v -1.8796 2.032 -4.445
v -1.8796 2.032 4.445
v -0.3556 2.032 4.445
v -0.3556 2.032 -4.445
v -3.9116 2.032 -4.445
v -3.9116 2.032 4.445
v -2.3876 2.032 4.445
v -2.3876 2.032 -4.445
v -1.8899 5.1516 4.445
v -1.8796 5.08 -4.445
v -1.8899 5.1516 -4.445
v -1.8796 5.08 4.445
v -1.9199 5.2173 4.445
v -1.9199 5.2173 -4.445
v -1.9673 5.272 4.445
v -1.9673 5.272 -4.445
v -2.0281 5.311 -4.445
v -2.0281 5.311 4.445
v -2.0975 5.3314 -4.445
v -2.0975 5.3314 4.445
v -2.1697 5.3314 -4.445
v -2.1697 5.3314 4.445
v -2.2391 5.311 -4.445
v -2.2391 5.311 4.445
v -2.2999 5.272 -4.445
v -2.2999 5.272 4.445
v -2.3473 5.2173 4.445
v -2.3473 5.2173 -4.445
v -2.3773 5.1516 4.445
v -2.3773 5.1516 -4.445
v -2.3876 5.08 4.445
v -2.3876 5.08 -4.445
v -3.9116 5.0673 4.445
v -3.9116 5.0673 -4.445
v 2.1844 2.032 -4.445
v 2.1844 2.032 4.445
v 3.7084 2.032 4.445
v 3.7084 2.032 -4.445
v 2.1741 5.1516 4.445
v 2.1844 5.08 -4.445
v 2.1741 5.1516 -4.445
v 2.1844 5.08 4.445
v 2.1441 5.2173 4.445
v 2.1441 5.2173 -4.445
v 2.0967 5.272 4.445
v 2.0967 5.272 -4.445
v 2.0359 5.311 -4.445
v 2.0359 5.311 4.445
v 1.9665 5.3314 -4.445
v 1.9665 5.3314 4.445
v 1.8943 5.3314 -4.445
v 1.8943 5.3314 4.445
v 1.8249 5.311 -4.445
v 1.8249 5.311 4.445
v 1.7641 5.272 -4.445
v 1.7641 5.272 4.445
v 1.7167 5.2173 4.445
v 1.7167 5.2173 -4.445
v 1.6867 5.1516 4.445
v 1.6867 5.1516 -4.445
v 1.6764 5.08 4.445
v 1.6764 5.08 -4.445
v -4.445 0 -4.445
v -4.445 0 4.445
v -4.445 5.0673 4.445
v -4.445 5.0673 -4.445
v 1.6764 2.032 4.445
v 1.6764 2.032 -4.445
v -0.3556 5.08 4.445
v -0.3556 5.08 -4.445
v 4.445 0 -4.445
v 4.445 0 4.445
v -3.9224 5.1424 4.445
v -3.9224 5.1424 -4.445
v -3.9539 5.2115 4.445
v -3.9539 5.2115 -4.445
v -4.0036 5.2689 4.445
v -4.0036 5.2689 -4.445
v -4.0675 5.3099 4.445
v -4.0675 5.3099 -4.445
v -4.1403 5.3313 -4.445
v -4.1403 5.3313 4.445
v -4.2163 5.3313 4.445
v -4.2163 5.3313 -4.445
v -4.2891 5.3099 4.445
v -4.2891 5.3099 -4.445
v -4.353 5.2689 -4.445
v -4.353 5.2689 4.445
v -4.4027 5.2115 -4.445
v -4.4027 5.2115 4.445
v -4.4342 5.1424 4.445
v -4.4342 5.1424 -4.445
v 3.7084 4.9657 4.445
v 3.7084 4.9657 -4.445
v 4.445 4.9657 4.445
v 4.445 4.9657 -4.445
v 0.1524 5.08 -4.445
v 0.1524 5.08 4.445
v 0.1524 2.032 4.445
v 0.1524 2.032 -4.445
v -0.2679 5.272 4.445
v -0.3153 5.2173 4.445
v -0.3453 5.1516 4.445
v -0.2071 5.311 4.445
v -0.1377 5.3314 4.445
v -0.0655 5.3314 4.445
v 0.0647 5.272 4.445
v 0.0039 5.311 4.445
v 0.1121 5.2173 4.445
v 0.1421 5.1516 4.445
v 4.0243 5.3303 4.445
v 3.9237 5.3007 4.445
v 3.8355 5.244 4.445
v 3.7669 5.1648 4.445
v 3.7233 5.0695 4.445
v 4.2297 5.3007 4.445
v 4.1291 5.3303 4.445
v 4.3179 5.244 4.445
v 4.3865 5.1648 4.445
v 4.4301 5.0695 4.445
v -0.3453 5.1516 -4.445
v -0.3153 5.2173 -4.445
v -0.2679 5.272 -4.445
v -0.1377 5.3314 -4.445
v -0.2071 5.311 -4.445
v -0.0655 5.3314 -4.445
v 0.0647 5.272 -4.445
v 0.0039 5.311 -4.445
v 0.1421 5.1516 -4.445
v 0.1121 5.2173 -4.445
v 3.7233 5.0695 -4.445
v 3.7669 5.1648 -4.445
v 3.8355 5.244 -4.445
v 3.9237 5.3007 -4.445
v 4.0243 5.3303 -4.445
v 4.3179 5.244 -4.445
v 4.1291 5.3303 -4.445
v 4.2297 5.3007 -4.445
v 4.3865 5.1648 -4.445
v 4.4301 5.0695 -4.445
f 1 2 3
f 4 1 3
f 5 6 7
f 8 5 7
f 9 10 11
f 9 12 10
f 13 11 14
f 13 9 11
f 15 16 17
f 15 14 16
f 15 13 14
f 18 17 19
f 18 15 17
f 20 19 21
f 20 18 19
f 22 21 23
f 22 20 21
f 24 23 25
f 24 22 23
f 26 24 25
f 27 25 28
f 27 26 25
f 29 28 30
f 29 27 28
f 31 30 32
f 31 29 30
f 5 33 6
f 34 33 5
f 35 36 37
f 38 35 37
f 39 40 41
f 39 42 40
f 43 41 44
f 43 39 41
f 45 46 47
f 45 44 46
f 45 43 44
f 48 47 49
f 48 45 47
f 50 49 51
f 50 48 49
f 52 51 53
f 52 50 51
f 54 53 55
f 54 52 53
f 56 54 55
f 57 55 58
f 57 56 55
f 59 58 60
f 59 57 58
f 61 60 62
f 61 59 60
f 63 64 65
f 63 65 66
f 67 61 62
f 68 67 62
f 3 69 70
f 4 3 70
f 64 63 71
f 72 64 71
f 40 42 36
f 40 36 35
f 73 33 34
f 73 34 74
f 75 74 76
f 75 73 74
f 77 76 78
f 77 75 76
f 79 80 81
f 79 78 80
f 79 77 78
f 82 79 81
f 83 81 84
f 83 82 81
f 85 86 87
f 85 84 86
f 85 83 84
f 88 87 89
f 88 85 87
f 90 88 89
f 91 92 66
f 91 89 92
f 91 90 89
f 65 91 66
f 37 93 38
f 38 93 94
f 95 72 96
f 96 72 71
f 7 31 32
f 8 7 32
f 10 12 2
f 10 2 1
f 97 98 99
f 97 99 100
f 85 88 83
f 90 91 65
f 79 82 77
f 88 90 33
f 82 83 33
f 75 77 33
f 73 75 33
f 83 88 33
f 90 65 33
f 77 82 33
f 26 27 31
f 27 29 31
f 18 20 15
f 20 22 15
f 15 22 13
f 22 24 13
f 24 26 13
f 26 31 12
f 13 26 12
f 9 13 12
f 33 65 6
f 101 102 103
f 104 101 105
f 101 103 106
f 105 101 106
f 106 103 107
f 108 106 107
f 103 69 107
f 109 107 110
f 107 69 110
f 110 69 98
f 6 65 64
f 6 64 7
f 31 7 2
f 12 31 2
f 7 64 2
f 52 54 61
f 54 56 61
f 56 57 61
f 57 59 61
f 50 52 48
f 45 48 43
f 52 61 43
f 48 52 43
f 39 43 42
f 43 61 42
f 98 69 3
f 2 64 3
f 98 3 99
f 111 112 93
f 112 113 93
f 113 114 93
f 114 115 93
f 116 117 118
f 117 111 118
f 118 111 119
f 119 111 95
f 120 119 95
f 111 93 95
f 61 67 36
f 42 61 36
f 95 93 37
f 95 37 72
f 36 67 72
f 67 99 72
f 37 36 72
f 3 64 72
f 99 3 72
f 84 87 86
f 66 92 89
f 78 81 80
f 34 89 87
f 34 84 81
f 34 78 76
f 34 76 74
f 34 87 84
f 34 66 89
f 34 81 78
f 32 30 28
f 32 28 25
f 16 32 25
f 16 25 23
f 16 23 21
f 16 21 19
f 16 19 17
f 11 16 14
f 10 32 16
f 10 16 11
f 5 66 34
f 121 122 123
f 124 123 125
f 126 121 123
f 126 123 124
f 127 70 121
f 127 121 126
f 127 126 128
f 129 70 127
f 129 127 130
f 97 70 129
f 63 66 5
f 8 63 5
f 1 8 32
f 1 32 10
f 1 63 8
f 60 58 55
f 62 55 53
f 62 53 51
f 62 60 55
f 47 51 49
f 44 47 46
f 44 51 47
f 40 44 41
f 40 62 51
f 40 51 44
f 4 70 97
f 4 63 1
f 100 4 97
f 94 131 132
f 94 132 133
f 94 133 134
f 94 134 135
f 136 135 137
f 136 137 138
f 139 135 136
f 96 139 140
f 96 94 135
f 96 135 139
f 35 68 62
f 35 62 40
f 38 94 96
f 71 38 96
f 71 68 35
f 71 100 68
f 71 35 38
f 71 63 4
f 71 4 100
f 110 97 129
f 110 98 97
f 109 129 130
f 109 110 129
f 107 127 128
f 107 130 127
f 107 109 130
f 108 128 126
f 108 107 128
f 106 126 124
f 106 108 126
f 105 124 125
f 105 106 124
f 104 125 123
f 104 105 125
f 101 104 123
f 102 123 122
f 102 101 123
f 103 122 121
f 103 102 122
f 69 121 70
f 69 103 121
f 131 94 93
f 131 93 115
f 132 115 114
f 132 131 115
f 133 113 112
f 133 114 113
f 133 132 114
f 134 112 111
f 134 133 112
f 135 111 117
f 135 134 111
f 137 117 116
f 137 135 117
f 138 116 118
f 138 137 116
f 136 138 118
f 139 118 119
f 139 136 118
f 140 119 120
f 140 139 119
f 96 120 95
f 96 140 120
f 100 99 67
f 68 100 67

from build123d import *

# Parameters (mm, degrees)
SKETCH1_W           = 8.89
SKETCH1_H           = 8.89
BOSS_EXTRUDE1_DEPTH = 5.334
SKETCH2_W           = 1.524
SKETCH2_H           = 8.89
CUT_EXTRUDE1_DEPTH  = 3.302
FILLET3_RADIUS      = 0.3683
FILLET3_LENGTH      = 8.89
FILLET4_RADIUS      = 0.254
FILLET4_LENGTH      = 8.89
FILLET5_RADIUS      = 0.254
FILLET5_LENGTH      = 8.89
FILLET6_RADIUS      = 0.254
FILLET6_LENGTH      = 8.89
FILLET7_RADIUS      = 0.2667
FILLET7_LENGTH      = 8.89


with BuildPart() as part:
    # Sketch1 → Boss-Extrude1 (new body)
    with BuildSketch(Plane(origin=(0, 0, 0), x_dir=(1, 0, 0), z_dir=(0, 1, 0))):
        Rectangle(SKETCH1_W, SKETCH1_H)
    extrude(amount=BOSS_EXTRUDE1_DEPTH)

    # Sketch2 → Cut-Extrude1 (cut)
    with BuildSketch(Plane(origin=(0, 5.334, 0), x_dir=(1, 0, 0), z_dir=(0, 1, 0))):
        with Locations((-3.1496, 0)):
            Rectangle(SKETCH2_W, SKETCH2_H)
        with Locations((-1.1176, 0)):
            Rectangle(SKETCH2_W, SKETCH2_H)
        with Locations((0.9144, 0)):
            Rectangle(SKETCH2_W, SKETCH2_H)
        with Locations((2.9464, 0)):
            Rectangle(SKETCH2_W, SKETCH2_H)
    extrude(amount=-CUT_EXTRUDE1_DEPTH, mode=Mode.SUBTRACT)

    # Fillet3: full round fillet: the end face becomes a half cylinder, R = half its width
    fillet3_face = Plane((4.0767, 5.334, 0), x_dir=(0, 0, -1), z_dir=(0, 1, 0))  # on the end face: x along it, z out of the body
    fillet3_slab = fillet3_face.offset(-FILLET3_RADIUS / 2) * Box(FILLET3_LENGTH, 2 * FILLET3_RADIUS, FILLET3_RADIUS, mode=Mode.PRIVATE)  # the body's end, R deep
    fillet3_round = Plane((4.0767, 4.9657, 0), x_dir=(0, 1, 0), z_dir=(0, 0, -1)) * Cylinder(FILLET3_RADIUS, FILLET3_LENGTH, mode=Mode.PRIVATE)  # its axis R under the face
    add(fillet3_slab - fillet3_round, mode=Mode.SUBTRACT)

    # Fillet4: full round fillet: the end face becomes a half cylinder, R = half its width
    fillet4_face = Plane((1.9304, 5.334, 0), x_dir=(0, 0, 1), z_dir=(0, 1, 0))  # on the end face: x along it, z out of the body
    fillet4_slab = fillet4_face.offset(-FILLET4_RADIUS / 2) * Box(FILLET4_LENGTH, 2 * FILLET4_RADIUS, FILLET4_RADIUS, mode=Mode.PRIVATE)  # the body's end, R deep
    fillet4_round = Plane((1.9304, 5.08, 0), x_dir=(0, 1, 0), z_dir=(0, 0, 1)) * Cylinder(FILLET4_RADIUS, FILLET4_LENGTH, mode=Mode.PRIVATE)  # its axis R under the face
    add(fillet4_slab - fillet4_round, mode=Mode.SUBTRACT)

    # Fillet5: full round fillet: the end face becomes a half cylinder, R = half its width
    fillet5_face = Plane((-0.1016, 5.334, 0), x_dir=(0, 0, 1), z_dir=(0, 1, 0))  # on the end face: x along it, z out of the body
    fillet5_slab = fillet5_face.offset(-FILLET5_RADIUS / 2) * Box(FILLET5_LENGTH, 2 * FILLET5_RADIUS, FILLET5_RADIUS, mode=Mode.PRIVATE)  # the body's end, R deep
    fillet5_round = Plane((-0.1016, 5.08, 0), x_dir=(0, 1, 0), z_dir=(0, 0, 1)) * Cylinder(FILLET5_RADIUS, FILLET5_LENGTH, mode=Mode.PRIVATE)  # its axis R under the face
    add(fillet5_slab - fillet5_round, mode=Mode.SUBTRACT)

    # Fillet6: full round fillet: the end face becomes a half cylinder, R = half its width
    fillet6_face = Plane((-2.1336, 5.334, 0), x_dir=(0, 0, 1), z_dir=(0, 1, 0))  # on the end face: x along it, z out of the body
    fillet6_slab = fillet6_face.offset(-FILLET6_RADIUS / 2) * Box(FILLET6_LENGTH, 2 * FILLET6_RADIUS, FILLET6_RADIUS, mode=Mode.PRIVATE)  # the body's end, R deep
    fillet6_round = Plane((-2.1336, 5.08, 0), x_dir=(0, 1, 0), z_dir=(0, 0, 1)) * Cylinder(FILLET6_RADIUS, FILLET6_LENGTH, mode=Mode.PRIVATE)  # its axis R under the face
    add(fillet6_slab - fillet6_round, mode=Mode.SUBTRACT)

    # Fillet7: full round fillet: the end face becomes a half cylinder, R = half its width
    fillet7_face = Plane((-4.1783, 5.334, 0), x_dir=(0, 0, 1), z_dir=(0, 1, 0))  # on the end face: x along it, z out of the body
    fillet7_slab = fillet7_face.offset(-FILLET7_RADIUS / 2) * Box(FILLET7_LENGTH, 2 * FILLET7_RADIUS, FILLET7_RADIUS, mode=Mode.PRIVATE)  # the body's end, R deep
    fillet7_round = Plane((-4.1783, 5.0673, 0), x_dir=(0, 1, 0), z_dir=(0, 0, 1)) * Cylinder(FILLET7_RADIUS, FILLET7_LENGTH, mode=Mode.PRIVATE)  # its axis R under the face
    add(fillet7_slab - fillet7_round, mode=Mode.SUBTRACT)


solid = part.part
